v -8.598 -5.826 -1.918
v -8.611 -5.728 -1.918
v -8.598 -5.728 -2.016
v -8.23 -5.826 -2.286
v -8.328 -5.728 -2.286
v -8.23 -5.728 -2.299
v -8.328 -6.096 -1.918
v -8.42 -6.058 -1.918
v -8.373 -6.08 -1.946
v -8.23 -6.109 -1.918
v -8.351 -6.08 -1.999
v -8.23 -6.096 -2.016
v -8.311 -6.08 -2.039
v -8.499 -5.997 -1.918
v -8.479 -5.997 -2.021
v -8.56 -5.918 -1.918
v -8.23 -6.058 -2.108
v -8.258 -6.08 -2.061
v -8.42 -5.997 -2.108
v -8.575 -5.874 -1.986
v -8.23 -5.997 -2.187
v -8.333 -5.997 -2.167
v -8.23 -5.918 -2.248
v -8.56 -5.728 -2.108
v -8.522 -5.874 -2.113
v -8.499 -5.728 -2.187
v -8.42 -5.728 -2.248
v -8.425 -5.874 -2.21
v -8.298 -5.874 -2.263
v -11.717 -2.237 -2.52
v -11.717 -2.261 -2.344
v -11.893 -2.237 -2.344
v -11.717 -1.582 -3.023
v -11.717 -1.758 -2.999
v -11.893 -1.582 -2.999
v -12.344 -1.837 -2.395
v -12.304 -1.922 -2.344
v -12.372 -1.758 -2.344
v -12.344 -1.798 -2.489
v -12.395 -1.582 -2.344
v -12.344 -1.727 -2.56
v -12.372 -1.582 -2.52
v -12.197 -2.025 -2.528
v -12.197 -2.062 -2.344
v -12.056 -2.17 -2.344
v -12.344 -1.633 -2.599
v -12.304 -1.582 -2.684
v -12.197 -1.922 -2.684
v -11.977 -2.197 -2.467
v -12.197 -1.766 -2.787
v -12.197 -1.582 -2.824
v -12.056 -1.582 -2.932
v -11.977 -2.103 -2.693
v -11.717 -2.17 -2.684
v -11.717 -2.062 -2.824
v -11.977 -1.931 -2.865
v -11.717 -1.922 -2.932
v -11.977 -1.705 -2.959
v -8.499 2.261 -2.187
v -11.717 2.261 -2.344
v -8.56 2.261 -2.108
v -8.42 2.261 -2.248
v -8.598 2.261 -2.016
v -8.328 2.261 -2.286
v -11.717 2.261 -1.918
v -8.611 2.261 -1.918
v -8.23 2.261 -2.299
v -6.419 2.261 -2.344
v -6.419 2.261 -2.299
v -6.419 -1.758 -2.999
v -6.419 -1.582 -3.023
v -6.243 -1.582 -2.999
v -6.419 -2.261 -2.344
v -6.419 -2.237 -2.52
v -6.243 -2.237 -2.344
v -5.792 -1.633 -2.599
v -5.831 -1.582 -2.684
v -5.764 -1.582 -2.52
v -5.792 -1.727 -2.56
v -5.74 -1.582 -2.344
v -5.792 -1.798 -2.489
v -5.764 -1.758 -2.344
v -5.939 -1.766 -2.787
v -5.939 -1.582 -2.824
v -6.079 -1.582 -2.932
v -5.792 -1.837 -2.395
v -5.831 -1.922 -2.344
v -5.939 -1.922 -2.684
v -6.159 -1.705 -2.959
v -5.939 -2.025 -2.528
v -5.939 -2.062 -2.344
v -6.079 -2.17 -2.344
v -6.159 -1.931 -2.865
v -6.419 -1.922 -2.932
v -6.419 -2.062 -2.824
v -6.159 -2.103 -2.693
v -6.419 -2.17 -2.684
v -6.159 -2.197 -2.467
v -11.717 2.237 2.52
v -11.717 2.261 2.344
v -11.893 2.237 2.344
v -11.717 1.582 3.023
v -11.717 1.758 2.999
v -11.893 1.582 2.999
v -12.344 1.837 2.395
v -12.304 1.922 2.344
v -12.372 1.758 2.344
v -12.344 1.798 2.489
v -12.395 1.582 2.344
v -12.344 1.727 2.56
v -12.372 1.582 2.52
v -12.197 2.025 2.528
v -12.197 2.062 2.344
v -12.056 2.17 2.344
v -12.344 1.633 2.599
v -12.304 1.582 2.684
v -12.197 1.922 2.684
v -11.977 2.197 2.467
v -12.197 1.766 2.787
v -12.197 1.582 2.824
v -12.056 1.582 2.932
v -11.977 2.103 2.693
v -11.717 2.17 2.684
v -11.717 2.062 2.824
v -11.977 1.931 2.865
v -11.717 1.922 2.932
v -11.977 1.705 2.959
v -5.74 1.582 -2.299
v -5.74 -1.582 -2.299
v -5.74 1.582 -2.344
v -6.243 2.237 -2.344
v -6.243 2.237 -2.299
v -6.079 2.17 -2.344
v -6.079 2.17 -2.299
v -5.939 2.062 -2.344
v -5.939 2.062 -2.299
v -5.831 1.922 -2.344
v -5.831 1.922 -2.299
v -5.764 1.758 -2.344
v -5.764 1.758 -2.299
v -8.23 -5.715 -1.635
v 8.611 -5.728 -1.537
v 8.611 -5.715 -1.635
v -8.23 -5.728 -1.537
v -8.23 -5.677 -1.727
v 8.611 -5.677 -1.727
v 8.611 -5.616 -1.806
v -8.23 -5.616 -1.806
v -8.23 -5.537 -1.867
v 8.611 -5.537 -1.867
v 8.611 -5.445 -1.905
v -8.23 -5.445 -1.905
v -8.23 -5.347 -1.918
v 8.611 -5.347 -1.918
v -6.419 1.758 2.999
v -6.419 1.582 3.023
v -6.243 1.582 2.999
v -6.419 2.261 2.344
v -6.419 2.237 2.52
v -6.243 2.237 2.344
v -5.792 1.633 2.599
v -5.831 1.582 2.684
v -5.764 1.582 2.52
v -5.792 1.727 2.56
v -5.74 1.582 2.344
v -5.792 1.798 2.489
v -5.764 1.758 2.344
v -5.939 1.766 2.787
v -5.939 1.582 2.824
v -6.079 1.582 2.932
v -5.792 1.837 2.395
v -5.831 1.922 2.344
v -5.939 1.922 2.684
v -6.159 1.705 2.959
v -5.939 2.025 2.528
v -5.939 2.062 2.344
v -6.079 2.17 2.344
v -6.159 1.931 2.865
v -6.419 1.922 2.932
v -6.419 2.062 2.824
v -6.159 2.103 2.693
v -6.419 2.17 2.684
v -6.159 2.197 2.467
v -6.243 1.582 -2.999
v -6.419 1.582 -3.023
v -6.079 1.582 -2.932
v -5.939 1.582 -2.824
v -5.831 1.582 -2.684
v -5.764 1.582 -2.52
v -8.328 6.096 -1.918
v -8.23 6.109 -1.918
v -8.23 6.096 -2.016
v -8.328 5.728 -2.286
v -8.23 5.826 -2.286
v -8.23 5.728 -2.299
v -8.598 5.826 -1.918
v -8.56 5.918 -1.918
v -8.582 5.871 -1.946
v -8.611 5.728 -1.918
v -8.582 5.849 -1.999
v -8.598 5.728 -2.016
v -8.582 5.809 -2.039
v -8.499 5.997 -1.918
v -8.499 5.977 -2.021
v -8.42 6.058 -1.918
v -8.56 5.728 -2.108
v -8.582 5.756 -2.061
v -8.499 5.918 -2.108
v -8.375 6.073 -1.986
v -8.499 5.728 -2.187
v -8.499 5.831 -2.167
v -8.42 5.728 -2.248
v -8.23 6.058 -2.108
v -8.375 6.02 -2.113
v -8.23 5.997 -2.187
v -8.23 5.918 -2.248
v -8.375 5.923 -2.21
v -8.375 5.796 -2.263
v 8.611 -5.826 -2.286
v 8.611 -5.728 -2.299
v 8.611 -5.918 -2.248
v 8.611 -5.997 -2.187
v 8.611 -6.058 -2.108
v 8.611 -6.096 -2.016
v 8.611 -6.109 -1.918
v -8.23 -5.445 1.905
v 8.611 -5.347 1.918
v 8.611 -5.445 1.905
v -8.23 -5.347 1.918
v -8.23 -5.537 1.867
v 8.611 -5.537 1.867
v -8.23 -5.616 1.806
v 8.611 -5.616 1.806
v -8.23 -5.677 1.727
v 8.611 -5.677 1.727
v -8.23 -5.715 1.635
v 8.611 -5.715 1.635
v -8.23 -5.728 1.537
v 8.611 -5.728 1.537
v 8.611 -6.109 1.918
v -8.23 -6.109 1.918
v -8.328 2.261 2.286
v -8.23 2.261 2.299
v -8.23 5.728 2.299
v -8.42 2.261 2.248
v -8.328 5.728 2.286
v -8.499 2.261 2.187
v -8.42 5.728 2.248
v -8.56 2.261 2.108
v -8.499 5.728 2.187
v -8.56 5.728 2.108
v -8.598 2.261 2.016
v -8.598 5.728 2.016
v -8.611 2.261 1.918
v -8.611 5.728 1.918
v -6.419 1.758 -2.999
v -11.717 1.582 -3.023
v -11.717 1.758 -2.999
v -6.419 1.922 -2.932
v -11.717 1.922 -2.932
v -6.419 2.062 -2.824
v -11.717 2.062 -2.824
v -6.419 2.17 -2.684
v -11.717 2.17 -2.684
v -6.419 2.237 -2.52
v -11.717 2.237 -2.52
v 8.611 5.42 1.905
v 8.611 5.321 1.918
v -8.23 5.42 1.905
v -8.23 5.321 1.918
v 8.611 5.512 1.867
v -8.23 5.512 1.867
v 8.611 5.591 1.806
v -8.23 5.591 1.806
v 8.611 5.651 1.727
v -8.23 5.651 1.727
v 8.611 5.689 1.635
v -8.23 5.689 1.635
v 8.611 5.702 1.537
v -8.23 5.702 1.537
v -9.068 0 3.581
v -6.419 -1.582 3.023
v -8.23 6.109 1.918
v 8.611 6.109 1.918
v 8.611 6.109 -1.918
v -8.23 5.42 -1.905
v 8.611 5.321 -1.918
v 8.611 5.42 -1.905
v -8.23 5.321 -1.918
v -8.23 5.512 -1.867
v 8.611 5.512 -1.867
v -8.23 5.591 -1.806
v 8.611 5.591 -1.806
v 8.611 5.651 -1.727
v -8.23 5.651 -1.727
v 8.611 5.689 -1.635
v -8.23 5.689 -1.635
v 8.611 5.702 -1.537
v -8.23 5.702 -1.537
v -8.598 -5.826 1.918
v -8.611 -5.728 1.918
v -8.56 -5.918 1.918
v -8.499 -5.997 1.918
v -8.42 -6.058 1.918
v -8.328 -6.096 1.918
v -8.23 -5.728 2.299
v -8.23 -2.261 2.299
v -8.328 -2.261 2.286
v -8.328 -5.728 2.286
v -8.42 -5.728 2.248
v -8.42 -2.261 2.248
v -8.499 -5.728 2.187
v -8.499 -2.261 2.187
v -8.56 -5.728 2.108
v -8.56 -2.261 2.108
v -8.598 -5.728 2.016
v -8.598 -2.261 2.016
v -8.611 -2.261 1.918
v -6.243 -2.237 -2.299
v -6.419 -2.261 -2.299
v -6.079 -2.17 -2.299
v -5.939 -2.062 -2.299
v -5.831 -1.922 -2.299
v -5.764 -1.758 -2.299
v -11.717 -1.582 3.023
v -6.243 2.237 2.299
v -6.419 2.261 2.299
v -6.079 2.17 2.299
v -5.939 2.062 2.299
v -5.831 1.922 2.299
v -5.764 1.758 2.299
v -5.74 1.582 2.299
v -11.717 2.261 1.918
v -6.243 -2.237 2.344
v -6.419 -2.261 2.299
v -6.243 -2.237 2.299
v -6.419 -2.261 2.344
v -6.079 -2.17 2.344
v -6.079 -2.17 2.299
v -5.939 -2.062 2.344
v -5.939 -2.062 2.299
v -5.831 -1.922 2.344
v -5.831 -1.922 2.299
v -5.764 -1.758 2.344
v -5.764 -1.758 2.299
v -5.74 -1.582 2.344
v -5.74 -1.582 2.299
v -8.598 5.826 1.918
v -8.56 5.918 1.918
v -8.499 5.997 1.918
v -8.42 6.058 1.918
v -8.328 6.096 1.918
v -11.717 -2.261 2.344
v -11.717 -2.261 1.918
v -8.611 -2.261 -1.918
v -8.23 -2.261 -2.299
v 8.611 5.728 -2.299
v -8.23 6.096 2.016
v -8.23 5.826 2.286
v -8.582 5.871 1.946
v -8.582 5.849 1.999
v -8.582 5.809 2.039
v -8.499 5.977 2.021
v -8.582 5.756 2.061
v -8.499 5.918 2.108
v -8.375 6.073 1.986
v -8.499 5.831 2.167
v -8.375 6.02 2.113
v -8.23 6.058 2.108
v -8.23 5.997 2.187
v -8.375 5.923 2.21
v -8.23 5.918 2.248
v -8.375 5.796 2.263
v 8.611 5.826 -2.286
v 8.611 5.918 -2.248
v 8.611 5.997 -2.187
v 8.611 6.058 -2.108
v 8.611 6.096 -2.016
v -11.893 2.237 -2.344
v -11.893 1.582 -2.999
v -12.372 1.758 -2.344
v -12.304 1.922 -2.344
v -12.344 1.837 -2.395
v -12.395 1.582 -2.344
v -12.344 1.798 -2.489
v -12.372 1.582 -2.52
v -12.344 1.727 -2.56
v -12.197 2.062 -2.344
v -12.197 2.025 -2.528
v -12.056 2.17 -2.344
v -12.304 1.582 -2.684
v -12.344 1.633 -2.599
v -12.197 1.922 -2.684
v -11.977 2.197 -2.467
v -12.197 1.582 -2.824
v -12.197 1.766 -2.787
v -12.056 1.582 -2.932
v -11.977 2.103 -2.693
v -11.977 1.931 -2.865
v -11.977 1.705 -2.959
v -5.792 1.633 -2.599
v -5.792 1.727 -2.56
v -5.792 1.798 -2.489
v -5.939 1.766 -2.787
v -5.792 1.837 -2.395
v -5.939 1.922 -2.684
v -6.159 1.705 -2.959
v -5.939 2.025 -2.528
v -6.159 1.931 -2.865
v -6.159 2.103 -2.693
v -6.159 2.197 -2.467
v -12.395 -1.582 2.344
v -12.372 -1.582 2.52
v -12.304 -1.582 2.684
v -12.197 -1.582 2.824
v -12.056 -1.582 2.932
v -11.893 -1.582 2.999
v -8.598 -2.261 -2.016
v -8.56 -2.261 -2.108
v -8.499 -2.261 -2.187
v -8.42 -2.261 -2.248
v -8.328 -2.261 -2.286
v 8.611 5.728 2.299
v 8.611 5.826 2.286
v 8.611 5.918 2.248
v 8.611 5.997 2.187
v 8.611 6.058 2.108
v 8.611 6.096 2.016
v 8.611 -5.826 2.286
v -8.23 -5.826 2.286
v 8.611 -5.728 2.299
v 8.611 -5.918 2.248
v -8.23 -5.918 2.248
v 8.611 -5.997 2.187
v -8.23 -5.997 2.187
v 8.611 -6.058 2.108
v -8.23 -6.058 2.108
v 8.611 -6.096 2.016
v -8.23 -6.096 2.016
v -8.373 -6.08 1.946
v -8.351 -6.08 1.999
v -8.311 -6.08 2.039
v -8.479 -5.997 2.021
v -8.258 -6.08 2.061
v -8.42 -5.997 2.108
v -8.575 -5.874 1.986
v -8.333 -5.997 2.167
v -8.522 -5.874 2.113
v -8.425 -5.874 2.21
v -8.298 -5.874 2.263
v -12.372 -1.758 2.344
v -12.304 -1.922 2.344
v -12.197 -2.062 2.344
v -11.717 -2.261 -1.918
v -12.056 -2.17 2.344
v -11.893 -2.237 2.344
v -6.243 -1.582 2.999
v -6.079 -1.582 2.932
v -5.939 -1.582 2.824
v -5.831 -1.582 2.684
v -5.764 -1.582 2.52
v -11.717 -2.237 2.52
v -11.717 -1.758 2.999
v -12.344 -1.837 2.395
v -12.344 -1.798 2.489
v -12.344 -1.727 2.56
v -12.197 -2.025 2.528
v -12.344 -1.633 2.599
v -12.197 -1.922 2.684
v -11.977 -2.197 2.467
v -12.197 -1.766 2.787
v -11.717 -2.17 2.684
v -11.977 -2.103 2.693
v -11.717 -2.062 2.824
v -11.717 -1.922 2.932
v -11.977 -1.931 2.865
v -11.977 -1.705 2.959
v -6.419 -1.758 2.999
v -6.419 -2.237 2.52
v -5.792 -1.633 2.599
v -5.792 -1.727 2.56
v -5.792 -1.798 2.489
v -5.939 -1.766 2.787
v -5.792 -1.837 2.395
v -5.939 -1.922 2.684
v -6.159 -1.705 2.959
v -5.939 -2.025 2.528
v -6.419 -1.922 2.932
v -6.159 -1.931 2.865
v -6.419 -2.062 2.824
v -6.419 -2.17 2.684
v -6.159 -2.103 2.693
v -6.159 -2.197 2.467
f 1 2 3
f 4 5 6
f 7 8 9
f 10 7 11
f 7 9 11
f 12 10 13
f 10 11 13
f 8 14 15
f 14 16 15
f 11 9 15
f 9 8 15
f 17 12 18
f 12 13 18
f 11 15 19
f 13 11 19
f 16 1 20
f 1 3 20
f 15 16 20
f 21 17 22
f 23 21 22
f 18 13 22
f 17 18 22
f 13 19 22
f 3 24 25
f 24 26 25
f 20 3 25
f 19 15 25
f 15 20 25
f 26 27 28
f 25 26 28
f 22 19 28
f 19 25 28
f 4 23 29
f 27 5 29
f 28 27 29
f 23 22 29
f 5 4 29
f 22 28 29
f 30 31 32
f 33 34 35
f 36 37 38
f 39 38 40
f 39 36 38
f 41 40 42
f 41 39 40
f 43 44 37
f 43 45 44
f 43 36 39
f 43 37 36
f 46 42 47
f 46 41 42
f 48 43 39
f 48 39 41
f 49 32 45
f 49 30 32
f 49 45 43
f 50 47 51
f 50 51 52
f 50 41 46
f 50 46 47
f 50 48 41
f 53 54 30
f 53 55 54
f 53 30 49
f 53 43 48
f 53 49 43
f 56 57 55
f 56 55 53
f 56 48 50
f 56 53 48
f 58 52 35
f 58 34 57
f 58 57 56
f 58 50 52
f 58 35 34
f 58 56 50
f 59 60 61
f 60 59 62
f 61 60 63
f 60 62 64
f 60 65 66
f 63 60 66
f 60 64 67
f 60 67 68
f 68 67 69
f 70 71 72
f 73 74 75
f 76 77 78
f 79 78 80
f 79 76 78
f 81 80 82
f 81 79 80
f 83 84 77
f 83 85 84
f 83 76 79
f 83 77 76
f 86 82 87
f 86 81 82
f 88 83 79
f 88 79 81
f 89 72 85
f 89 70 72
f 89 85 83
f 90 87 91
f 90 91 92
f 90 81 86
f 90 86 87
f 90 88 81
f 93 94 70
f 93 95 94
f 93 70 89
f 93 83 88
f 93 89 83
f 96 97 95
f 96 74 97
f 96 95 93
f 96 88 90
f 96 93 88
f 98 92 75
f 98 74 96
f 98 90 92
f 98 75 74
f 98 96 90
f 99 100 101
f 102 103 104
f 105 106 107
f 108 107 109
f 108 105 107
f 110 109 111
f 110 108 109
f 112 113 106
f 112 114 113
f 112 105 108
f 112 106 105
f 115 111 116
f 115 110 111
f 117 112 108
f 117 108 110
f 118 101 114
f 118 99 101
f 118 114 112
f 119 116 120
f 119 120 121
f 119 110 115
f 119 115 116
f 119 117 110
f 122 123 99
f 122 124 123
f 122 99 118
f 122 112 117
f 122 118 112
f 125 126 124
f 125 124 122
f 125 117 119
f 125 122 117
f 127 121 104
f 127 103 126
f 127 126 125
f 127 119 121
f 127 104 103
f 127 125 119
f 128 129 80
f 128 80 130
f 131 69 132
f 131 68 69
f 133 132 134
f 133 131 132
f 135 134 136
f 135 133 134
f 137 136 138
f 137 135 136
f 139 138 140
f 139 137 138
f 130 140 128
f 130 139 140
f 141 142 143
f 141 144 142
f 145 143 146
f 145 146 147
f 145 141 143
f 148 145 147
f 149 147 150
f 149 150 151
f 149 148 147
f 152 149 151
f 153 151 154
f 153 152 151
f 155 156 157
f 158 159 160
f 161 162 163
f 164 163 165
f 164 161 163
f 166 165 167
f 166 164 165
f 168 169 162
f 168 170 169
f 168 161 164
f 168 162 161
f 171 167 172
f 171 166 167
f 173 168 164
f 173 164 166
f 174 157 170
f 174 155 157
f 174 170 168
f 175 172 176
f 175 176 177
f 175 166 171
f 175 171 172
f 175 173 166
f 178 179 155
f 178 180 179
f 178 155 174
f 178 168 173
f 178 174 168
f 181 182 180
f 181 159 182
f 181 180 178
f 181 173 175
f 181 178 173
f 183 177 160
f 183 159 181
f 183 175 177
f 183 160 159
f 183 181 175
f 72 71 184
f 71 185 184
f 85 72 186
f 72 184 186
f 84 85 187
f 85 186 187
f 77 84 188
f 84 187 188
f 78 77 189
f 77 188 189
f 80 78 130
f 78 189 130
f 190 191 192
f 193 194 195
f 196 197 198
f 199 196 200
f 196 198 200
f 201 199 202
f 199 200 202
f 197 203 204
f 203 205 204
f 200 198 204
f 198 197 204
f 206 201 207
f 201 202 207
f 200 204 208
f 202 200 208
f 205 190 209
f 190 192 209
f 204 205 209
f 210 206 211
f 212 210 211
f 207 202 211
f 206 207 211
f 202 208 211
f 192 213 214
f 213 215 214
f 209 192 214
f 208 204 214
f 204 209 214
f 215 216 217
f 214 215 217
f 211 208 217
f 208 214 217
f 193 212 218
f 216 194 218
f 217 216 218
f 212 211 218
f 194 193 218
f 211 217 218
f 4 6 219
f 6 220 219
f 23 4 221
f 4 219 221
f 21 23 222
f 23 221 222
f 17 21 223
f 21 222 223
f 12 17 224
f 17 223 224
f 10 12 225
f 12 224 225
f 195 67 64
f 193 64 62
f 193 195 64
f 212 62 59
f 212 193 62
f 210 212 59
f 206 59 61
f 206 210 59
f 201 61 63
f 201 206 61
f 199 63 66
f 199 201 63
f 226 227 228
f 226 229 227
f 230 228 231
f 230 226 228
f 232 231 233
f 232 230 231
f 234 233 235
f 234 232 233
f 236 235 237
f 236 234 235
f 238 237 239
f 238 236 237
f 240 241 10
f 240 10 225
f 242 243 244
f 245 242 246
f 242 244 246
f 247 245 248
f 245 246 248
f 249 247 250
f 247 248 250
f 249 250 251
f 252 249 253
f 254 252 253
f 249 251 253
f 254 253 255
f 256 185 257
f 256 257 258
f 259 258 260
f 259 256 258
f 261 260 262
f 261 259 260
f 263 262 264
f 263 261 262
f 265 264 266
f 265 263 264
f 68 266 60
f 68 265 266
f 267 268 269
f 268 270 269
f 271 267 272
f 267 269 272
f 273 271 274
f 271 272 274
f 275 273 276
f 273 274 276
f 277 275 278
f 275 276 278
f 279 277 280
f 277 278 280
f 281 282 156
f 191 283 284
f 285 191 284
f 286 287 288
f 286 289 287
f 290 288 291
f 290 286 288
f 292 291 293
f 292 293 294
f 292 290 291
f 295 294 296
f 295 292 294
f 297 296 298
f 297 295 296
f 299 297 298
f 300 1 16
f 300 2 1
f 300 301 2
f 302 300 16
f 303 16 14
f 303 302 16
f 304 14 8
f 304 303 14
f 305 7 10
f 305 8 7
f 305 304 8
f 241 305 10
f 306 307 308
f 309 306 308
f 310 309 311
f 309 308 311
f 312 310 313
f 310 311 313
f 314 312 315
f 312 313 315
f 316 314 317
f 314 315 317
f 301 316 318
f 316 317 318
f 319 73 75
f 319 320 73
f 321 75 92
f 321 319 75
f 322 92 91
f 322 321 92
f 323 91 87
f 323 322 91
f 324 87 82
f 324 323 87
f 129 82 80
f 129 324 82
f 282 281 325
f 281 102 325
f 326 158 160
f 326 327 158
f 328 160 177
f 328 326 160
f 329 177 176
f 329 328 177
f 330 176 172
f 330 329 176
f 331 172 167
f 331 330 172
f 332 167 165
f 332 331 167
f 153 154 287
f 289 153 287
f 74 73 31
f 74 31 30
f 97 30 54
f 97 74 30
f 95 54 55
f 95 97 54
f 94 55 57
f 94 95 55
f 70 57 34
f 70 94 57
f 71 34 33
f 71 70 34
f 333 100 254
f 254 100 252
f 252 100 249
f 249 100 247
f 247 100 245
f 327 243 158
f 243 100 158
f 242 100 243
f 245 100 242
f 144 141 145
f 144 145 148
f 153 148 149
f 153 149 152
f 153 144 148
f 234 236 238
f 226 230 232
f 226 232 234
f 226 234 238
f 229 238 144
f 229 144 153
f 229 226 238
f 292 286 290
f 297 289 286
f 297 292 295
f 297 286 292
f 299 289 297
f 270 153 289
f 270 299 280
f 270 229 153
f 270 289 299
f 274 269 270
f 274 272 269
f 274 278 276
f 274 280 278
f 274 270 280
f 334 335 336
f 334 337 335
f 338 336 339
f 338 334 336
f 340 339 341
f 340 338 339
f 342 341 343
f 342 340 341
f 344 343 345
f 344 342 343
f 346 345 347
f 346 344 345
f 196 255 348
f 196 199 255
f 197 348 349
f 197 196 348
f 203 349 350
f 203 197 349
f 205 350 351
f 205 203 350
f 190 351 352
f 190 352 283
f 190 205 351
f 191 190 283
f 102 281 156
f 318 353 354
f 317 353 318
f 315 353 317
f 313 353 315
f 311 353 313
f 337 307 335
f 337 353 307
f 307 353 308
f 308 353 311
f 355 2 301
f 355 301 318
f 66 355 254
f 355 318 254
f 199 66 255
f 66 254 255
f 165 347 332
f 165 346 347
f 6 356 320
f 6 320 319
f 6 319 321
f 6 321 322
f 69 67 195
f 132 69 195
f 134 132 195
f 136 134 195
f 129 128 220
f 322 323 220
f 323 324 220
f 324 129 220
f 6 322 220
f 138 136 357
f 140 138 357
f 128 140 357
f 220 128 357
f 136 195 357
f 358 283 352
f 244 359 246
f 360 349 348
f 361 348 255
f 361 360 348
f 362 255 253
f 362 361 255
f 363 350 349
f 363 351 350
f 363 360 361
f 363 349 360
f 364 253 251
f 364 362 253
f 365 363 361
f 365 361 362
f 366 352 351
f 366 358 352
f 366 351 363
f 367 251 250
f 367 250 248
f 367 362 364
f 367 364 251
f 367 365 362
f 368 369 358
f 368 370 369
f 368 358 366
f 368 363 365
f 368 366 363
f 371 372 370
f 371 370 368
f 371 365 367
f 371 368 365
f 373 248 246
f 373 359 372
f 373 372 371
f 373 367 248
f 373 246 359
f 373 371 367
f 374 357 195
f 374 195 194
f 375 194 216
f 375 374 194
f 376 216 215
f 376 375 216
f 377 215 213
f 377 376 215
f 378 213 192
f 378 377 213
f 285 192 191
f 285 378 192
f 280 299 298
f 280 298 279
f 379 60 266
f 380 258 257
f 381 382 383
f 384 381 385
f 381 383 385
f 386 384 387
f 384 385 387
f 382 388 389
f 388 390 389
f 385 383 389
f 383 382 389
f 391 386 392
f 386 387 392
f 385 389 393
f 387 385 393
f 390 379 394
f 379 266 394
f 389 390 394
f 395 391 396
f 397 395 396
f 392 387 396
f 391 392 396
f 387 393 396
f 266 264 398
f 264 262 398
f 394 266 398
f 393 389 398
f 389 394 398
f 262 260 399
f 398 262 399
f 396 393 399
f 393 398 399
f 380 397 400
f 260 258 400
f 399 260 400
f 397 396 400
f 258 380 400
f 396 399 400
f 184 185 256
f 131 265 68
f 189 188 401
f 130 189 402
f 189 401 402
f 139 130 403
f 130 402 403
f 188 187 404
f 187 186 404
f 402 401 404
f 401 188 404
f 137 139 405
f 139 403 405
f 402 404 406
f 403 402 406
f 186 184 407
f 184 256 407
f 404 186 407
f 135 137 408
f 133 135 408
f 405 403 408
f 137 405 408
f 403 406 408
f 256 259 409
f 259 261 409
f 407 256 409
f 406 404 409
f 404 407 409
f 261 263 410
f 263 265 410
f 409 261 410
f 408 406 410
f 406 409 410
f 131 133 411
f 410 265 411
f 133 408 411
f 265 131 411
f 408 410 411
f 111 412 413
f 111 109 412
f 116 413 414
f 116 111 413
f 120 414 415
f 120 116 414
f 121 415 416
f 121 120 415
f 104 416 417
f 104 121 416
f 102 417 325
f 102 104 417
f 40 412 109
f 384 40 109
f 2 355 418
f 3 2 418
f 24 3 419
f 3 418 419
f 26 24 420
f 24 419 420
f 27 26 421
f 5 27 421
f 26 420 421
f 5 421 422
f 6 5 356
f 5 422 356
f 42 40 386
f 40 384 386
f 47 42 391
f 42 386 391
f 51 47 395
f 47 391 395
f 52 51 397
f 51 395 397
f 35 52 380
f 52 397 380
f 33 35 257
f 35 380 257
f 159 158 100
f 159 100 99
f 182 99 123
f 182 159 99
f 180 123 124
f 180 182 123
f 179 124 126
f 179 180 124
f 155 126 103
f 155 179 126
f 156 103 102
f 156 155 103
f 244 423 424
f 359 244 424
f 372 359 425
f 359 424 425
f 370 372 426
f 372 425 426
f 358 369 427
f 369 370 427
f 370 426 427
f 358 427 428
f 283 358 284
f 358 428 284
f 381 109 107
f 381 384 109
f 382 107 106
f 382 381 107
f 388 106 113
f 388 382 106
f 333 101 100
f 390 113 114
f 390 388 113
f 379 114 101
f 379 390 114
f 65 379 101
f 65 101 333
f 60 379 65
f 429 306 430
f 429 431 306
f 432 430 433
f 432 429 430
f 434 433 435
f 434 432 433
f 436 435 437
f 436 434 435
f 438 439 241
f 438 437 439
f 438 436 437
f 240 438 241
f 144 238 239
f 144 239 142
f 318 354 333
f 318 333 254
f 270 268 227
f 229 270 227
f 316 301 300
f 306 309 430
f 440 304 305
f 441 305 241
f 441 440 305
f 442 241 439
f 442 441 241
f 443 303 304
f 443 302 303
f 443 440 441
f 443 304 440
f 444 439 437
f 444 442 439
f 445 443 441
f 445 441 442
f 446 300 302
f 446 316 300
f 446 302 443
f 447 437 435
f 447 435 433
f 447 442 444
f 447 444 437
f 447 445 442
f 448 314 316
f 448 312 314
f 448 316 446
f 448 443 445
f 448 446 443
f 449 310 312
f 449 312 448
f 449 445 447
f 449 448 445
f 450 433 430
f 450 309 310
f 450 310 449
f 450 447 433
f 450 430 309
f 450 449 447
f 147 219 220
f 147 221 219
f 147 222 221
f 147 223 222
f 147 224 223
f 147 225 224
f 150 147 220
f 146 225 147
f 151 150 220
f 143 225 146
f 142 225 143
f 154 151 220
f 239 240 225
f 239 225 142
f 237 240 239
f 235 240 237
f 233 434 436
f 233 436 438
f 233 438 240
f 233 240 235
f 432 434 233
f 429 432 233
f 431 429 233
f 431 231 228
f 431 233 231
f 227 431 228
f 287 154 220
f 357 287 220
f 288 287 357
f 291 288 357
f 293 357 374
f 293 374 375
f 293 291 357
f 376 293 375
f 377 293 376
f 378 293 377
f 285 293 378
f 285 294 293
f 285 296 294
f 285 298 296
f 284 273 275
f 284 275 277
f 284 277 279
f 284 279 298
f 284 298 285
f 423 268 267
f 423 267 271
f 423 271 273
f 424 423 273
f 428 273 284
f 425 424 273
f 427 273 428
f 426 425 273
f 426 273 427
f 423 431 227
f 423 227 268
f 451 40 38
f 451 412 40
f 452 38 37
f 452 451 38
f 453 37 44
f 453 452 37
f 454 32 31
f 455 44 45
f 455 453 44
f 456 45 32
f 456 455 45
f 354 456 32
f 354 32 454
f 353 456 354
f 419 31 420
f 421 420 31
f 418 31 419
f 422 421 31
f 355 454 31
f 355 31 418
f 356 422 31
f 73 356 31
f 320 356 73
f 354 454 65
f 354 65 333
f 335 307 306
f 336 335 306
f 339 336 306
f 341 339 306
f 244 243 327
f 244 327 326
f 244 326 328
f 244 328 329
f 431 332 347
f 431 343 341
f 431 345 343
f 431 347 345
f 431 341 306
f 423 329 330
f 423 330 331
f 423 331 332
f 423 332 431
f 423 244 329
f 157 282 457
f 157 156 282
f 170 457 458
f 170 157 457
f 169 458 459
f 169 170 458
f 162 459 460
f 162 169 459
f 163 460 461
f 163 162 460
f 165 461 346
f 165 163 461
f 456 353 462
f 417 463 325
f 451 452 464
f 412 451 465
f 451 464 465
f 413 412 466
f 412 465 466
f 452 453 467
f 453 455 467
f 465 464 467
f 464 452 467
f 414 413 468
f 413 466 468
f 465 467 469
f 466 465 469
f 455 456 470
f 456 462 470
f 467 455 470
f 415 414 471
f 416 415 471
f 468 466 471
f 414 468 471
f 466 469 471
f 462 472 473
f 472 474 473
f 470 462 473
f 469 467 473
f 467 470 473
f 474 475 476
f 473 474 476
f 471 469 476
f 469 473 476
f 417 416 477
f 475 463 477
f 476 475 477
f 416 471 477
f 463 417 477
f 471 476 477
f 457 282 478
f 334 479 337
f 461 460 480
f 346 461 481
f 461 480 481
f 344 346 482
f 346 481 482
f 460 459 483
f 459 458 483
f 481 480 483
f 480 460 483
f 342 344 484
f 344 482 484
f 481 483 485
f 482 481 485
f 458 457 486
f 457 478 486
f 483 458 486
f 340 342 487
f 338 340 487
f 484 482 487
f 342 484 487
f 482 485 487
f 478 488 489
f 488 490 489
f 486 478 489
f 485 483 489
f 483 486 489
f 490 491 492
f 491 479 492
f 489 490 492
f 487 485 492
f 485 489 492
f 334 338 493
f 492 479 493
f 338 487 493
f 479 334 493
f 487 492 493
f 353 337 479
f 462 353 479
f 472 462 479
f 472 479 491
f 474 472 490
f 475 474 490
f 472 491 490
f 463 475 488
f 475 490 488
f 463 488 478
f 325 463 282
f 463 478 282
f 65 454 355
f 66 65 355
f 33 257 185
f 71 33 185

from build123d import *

# Parameters (mm, degrees)
F0_W      = 17.2212
F0_H      = 12.2174
F2_DEPTH  = 2.2987
F1_W      = 6.6548
F1_H      = 4.5212
F3_DEPTH  = 3.0226
F4_R      = 0.67818
F5_R      = 0.381
F3_FACE_W = 5.29844
F3_FACE_H = 3.16484
F8_W      = 3.10642
F8_H      = 3.8354
F9_DEPTH  = 4.5212
F11_DEPTH = 16.8402
F12_R     = 0.381


with BuildPart() as f2:
    # F0 (on Top) → F2 (new body, symmetric)
    with BuildSketch(Plane.XY):
        Rectangle(F0_W, F0_H)
    extrude(amount=F2_DEPTH, both=True)

    # F1 (on Top) → F3 (join, symmetric)
    with BuildSketch(Plane.XY):
        with Locations((-9.0678, 0)):
            Rectangle(F1_W, F1_H)
    extrude(amount=F3_DEPTH, both=True)

    # F4
    f4_edges = [f2.edges().sort_by_distance(p)[0] for p in [
        (-9.0678, 2.2606, 3.0226),
        (-9.0678, 2.2606, -3.0226),
        (-9.0678, -2.2606, 3.0226),
        (-9.0678, -2.2606, -3.0226),
        (-5.7404, 0, -3.0226),
        (-5.7404, 0, 3.0226),
        (-12.3952, -2.2606, 0),
        (-12.3952, 2.2606, 0),
        (-12.3952, 0, -3.0226),
        (-12.3952, 0, 3.0226),
        (-5.7404, 2.2606, -2.66065),
        (-5.7404, 2.2606, 2.66065),
        (-5.7404, -2.2606, 2.66065),
        (-5.7404, -2.2606, -2.66065),
    ]]
    fillet(f4_edges, radius=F4_R)

    # F5
    f5_edges = [f2.edges().sort_by_distance(p)[0] for p in [
        (0, 6.1087, 2.2987),
        (0, 6.1087, -2.2987),
        (-8.6106, 6.1087, 0),
        (-8.6106, -4.18465, 2.2987),
        (-8.6106, 4.18465, 2.2987),
        (-8.6106, -4.18465, -2.2987),
        (-8.6106, 4.18465, -2.2987),
        (-8.6106, -6.1087, 0),
        (0, -6.1087, 2.2987),
        (0, -6.1087, -2.2987),
    ]]
    fillet(f5_edges, radius=F5_R)

    # F3_face (on face) → F7 section 0
    with BuildSketch(Plane(origin=(-9.0678, 0, 3.0226), x_dir=(1, 0, 0), z_dir=(0, 0, 1)), mode=Mode.PRIVATE) as f7_s0:
        Rectangle(F3_FACE_W, F3_FACE_H)
    loft([f7_s0.sketch, Vertex(-9.0678, 0, 3.5814)])

    # F8 (on face) → F9 (cut)
    with BuildSketch(Plane.XZ.offset(2.2606)):
        with Locations((-10.16381, 0)):
            Rectangle(F8_W, F8_H)
    extrude(amount=-F9_DEPTH, mode=Mode.SUBTRACT)

    # F10 (on face) → F11 (cut)
    with BuildSketch(Plane.YZ.offset(8.6106)):
        Polygon((5.7023, 1.9177), (0, 1.9177), (-5.7277, 1.9177), (-5.7277, 0), (-5.7277, -1.9177), (0, -1.9177), (5.7023, -1.9177), align=None)
    extrude(amount=-F11_DEPTH, mode=Mode.SUBTRACT)

    # F12
    f12_edges = [f2.edges().sort_by_distance(p)[0] for p in [
        (0.1905, 5.7023, 1.9177),
        (0.1905, -5.7277, 1.9177),
        (0.1905, -5.7277, -1.9177),
        (0.1905, 5.7023, -1.9177),
    ]]
    fillet(f12_edges, radius=F12_R)


solid = f2.part
